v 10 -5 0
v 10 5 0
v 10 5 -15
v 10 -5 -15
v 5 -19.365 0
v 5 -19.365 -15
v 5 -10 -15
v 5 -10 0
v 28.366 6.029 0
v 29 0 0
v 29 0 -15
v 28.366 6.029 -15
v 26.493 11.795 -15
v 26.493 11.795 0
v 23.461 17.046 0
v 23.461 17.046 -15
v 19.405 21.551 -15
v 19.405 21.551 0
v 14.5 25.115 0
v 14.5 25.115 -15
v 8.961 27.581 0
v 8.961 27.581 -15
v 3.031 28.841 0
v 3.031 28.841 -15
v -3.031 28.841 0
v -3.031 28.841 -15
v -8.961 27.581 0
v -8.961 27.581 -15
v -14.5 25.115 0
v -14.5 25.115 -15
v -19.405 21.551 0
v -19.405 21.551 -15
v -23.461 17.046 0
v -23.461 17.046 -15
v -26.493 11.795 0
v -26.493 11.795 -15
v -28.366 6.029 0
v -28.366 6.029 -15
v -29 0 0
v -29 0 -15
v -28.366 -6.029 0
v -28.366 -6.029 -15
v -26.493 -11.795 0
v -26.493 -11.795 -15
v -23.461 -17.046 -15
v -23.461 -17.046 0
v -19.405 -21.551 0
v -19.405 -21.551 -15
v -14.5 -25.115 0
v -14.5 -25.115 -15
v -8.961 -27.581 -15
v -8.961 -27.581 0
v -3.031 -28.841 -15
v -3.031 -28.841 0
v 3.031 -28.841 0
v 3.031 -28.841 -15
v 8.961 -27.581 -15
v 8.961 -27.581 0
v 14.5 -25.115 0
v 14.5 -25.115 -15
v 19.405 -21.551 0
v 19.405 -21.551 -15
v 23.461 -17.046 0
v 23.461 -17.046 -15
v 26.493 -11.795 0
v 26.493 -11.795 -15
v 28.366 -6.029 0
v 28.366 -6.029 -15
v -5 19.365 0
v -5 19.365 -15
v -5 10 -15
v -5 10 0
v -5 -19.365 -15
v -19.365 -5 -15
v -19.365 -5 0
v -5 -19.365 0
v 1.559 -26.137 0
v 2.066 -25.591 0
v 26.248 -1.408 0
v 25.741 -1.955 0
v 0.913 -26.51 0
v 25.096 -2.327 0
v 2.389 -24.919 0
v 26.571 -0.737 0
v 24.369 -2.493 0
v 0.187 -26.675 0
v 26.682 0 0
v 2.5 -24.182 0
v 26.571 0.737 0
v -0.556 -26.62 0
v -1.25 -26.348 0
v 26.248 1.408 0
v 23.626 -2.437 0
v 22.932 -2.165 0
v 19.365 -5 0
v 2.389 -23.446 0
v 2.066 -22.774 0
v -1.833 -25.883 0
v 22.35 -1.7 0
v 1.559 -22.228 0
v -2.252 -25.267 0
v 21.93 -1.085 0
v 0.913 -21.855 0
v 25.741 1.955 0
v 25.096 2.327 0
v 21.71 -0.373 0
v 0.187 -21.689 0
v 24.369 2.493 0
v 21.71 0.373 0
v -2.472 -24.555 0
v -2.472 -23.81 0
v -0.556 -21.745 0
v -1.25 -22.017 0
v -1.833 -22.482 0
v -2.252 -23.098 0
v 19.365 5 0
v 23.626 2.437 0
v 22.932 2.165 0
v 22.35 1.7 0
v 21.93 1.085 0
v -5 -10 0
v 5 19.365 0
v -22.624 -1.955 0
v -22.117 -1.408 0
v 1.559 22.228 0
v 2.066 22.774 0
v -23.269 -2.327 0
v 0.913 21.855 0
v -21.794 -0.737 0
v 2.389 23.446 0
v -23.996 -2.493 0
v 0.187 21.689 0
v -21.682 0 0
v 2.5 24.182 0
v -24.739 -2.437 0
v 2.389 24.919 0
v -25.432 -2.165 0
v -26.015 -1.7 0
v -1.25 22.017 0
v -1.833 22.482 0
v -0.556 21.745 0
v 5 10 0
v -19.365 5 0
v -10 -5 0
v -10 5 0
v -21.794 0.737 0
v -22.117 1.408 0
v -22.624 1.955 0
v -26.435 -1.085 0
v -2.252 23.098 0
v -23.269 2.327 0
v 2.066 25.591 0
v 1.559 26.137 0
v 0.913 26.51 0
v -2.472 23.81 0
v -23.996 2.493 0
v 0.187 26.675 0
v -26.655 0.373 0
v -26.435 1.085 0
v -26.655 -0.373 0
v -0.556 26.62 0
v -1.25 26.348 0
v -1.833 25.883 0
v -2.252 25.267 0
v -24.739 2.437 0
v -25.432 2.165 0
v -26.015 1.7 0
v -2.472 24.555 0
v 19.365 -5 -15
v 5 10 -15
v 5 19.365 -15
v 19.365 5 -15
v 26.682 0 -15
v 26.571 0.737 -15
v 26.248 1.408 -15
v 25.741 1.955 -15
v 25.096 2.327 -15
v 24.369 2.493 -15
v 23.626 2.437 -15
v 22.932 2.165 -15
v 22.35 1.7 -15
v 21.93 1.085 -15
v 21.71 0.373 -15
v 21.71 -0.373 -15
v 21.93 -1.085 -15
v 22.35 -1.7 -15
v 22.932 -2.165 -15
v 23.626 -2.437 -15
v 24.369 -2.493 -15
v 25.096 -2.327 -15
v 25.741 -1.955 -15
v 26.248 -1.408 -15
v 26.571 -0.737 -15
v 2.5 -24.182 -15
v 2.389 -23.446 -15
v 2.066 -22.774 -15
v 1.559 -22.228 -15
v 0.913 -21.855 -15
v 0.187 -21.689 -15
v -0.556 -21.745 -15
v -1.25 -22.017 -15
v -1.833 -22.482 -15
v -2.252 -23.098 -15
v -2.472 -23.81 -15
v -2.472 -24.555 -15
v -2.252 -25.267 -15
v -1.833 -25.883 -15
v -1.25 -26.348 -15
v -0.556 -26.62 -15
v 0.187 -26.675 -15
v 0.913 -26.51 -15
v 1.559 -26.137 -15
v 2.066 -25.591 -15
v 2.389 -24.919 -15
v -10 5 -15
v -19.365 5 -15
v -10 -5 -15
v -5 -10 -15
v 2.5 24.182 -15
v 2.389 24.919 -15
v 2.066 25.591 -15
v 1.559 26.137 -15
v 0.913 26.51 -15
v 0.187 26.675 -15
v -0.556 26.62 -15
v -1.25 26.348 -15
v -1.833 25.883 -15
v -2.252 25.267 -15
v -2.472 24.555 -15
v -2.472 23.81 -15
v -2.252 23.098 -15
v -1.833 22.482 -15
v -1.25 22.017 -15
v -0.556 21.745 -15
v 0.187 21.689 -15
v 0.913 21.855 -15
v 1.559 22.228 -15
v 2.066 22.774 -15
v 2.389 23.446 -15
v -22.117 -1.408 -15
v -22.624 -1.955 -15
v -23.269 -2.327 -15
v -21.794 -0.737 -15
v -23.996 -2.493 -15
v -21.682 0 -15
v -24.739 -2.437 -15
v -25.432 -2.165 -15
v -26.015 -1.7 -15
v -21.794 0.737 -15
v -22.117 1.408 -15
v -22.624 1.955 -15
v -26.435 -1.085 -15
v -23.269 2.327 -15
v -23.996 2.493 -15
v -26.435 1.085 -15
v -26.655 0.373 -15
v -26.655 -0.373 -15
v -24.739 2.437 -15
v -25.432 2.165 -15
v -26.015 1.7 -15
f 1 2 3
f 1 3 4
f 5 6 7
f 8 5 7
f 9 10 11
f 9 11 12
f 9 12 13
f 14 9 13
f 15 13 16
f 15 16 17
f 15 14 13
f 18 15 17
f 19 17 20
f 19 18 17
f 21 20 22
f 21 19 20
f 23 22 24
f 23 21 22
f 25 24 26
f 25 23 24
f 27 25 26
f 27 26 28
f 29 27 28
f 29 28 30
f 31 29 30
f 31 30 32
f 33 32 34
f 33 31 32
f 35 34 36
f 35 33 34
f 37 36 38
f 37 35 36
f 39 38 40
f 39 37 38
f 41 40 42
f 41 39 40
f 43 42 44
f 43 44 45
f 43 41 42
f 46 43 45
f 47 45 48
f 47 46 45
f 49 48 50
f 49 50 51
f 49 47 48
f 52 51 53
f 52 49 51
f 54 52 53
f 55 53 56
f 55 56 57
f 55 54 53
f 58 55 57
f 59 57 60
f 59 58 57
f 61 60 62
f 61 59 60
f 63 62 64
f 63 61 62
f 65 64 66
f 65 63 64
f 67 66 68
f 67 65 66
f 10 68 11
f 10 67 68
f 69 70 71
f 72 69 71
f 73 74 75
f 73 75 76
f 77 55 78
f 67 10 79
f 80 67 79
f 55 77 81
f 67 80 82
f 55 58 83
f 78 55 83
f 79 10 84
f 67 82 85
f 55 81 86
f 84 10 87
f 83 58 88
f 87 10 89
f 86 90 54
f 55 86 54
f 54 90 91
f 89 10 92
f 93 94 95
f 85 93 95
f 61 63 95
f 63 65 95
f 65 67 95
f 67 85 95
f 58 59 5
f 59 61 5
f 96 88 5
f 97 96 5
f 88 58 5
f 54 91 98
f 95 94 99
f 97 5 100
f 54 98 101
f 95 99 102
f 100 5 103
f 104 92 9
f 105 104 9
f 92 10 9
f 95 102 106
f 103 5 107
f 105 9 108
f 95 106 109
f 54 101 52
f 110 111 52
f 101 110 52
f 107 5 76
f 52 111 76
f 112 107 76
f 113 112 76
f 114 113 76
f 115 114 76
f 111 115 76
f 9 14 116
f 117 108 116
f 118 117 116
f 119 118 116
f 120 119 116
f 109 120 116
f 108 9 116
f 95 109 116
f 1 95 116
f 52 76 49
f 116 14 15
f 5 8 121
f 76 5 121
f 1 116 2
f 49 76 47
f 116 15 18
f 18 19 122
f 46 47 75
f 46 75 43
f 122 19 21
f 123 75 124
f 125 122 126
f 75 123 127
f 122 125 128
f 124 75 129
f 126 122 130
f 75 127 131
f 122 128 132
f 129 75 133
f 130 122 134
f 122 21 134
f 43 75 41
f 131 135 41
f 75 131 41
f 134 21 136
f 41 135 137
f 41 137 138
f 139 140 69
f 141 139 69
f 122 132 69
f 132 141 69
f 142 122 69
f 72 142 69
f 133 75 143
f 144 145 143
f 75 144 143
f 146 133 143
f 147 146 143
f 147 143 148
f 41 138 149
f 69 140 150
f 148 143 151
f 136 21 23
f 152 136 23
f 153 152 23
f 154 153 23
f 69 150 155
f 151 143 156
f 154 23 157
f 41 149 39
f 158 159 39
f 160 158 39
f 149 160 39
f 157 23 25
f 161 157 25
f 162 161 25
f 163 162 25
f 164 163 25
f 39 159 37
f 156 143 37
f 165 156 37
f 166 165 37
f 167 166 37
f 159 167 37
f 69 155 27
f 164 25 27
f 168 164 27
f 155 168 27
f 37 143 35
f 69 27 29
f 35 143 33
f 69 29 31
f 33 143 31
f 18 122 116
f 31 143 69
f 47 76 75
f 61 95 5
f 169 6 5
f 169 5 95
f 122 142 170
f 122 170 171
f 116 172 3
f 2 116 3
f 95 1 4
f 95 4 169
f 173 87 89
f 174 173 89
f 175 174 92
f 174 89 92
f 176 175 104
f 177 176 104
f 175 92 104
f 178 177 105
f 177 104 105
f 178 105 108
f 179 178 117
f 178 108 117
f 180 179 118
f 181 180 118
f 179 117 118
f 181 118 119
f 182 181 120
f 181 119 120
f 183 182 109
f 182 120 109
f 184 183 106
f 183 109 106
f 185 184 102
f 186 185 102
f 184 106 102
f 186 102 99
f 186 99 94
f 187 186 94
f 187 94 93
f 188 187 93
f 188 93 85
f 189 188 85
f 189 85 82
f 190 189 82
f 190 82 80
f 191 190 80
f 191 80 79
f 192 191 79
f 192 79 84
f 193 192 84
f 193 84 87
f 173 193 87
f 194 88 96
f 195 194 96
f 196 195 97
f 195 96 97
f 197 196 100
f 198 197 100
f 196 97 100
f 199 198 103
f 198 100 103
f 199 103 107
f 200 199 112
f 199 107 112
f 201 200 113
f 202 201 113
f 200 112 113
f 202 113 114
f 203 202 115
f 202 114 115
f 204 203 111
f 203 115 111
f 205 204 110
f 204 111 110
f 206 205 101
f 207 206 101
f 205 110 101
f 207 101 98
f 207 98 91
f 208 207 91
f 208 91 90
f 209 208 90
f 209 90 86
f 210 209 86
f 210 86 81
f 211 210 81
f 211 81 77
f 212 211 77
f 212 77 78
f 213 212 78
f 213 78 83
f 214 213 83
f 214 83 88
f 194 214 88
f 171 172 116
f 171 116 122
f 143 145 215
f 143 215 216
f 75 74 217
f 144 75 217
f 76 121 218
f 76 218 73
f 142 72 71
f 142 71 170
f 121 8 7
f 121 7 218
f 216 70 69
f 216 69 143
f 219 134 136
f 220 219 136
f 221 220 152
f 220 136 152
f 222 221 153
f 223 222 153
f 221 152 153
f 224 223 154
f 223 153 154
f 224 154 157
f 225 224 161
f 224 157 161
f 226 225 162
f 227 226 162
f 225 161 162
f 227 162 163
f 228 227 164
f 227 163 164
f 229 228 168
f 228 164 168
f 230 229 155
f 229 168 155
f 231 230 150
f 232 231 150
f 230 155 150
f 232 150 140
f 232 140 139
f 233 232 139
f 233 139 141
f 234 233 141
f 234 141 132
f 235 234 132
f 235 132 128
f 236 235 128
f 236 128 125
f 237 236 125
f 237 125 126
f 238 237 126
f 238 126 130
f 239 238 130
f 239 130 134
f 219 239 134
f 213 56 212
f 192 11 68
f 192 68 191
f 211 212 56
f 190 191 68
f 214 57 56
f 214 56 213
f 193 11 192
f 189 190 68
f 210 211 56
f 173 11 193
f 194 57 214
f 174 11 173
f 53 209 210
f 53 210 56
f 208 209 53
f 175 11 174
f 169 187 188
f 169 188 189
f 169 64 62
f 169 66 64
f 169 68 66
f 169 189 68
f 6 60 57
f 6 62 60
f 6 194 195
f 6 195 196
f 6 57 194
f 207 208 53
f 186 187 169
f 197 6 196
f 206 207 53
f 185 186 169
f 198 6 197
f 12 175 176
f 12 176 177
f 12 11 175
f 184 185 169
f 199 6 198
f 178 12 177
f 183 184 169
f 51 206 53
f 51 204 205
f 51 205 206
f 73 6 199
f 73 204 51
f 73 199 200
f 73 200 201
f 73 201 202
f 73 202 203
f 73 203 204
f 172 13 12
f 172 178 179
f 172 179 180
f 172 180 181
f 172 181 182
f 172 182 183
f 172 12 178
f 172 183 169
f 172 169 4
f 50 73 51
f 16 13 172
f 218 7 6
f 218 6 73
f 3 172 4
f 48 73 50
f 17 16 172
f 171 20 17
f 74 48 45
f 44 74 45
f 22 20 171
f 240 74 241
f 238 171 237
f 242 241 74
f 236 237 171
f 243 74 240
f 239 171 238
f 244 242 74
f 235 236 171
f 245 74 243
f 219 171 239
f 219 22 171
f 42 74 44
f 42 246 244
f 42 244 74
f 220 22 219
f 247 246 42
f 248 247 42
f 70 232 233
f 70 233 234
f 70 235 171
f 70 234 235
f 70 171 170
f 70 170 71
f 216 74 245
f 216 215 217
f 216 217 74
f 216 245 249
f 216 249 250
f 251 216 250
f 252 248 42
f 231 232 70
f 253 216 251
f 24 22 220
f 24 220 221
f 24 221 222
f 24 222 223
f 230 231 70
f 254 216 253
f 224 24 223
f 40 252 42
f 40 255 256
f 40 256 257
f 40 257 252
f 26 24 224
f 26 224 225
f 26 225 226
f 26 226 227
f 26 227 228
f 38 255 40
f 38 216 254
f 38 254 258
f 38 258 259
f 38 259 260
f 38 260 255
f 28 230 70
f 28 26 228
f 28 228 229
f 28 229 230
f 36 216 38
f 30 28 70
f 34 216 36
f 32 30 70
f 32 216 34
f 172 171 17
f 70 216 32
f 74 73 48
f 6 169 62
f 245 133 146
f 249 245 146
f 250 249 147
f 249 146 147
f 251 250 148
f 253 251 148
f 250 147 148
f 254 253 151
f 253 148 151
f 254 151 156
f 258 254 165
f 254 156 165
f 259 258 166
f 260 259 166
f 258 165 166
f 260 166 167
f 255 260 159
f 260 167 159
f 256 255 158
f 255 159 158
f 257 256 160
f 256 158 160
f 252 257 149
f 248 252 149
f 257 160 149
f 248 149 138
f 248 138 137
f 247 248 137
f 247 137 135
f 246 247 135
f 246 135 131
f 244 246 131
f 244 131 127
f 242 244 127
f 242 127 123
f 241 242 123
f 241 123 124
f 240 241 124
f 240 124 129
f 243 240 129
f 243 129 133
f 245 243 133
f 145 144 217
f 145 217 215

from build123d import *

# Parameters (mm, degrees)
SKETCH6_R                 = 29
SKETCH6_R_2               = 20
INNER_RING_DEPTH          = 15
MOTOR_CONNECTOR_CUT_DEPTH = 15
SKETCH8_R                 = 2.5
M3_HOLES_DEPTH            = 38
M3_HOLES_DEPTH_BACK       = 53
BOSS_EXTRUDE1_DEPTH       = 15


with BuildPart() as part:
    # Sketch6 → Inner Ring (new body)
    with BuildSketch(Plane.XY):
        Circle(SKETCH6_R)
        Circle(SKETCH6_R_2, mode=Mode.SUBTRACT)
    extrude(amount=-INNER_RING_DEPTH)

    # Sketch7 → Motor Connector Cut (add)
    with BuildSketch(Plane.XY):
        with BuildLine():
            ThreePointArc((20, 0), (19.840593925, 2.52008585), (19.364916731, 5))
            Line((19.364916731, 5), (9.999996731, 5))
            Line((9.999996731, 5), (9.999996731, -5))
            Line((9.999996731, -5), (19.364916731, -5))
            ThreePointArc((19.364916731, -5), (19.840593925, -2.52008585), (20, 0))
        make_face()
        with BuildLine():
            ThreePointArc((5, 19.364916731), (0, 20), (-5, 19.364916731))
            Line((-5, 19.364916731), (-5, 9.999996731))
            Line((-5, 9.999996731), (5, 9.999996731))
            Line((5, 9.999996731), (5, 19.364916731))
        make_face()
        with BuildLine():
            Line((-9.999996731, -5), (-9.999996731, 5))
            Line((-9.999996731, 5), (-19.364916731, 5))
            ThreePointArc((-19.364916731, 5), (-20, 0), (-19.364916731, -5))
            Line((-19.364916731, -5), (-9.999996731, -5))
        make_face()
        with BuildLine():
            Line((-5, -9.999996731), (-5, -19.364916731))
            ThreePointArc((-5, -19.364916731), (0, -20), (5, -19.364916731))
            Line((5, -19.364916731), (5, -9.999996731))
            Line((5, -9.999996731), (-5, -9.999996731))
        make_face()
    extrude(amount=-MOTOR_CONNECTOR_CUT_DEPTH)

    # Sketch8 → M3 Holes (cut, two sides)
    with BuildSketch(Plane.XY) as m3_holes_sk:
        with Locations((0, 24.182458366)):
            Circle(SKETCH8_R)
        with Locations((24.182458366, 0)):
            Circle(SKETCH8_R)
        with Locations((0, -24.182458366)):
            Circle(SKETCH8_R)
        with Locations((-24.182458366, 0)):
            Circle(SKETCH8_R)
    extrude(amount=M3_HOLES_DEPTH, mode=Mode.SUBTRACT)
    extrude(m3_holes_sk.sketch, amount=-M3_HOLES_DEPTH_BACK, mode=Mode.SUBTRACT)

    # Sketch9 → Boss-Extrude1 (add)
    with BuildSketch(Plane(origin=(0, 0, -15), x_dir=(-1, 0, 0), z_dir=(0, 0, -1))):
        with BuildLine():
            Line((-19.364916731, 5), (-5, 19.364916731))
            ThreePointArc((-5, 19.364916731), (-14.142135624, 14.142135624), (-19.364916731, 5))
        make_face()
        with BuildLine():
            Line((5, 19.364916731), (19.364916731, 5))
            ThreePointArc((19.364916731, 5), (14.142135624, 14.142135624), (5, 19.364916731))
        make_face()
        with BuildLine():
            Line((19.364916731, -5), (5, -19.364916731))
            ThreePointArc((5, -19.364916731), (14.142135624, -14.142135624), (19.364916731, -5))
        make_face()
        with BuildLine():
            Line((-5, -19.364916731), (-19.364916731, -5))
            ThreePointArc((-19.364916731, -5), (-14.142135624, -14.142135624), (-5, -19.364916731))
        make_face()
    extrude(amount=-BOSS_EXTRUDE1_DEPTH)


solid = part.part
